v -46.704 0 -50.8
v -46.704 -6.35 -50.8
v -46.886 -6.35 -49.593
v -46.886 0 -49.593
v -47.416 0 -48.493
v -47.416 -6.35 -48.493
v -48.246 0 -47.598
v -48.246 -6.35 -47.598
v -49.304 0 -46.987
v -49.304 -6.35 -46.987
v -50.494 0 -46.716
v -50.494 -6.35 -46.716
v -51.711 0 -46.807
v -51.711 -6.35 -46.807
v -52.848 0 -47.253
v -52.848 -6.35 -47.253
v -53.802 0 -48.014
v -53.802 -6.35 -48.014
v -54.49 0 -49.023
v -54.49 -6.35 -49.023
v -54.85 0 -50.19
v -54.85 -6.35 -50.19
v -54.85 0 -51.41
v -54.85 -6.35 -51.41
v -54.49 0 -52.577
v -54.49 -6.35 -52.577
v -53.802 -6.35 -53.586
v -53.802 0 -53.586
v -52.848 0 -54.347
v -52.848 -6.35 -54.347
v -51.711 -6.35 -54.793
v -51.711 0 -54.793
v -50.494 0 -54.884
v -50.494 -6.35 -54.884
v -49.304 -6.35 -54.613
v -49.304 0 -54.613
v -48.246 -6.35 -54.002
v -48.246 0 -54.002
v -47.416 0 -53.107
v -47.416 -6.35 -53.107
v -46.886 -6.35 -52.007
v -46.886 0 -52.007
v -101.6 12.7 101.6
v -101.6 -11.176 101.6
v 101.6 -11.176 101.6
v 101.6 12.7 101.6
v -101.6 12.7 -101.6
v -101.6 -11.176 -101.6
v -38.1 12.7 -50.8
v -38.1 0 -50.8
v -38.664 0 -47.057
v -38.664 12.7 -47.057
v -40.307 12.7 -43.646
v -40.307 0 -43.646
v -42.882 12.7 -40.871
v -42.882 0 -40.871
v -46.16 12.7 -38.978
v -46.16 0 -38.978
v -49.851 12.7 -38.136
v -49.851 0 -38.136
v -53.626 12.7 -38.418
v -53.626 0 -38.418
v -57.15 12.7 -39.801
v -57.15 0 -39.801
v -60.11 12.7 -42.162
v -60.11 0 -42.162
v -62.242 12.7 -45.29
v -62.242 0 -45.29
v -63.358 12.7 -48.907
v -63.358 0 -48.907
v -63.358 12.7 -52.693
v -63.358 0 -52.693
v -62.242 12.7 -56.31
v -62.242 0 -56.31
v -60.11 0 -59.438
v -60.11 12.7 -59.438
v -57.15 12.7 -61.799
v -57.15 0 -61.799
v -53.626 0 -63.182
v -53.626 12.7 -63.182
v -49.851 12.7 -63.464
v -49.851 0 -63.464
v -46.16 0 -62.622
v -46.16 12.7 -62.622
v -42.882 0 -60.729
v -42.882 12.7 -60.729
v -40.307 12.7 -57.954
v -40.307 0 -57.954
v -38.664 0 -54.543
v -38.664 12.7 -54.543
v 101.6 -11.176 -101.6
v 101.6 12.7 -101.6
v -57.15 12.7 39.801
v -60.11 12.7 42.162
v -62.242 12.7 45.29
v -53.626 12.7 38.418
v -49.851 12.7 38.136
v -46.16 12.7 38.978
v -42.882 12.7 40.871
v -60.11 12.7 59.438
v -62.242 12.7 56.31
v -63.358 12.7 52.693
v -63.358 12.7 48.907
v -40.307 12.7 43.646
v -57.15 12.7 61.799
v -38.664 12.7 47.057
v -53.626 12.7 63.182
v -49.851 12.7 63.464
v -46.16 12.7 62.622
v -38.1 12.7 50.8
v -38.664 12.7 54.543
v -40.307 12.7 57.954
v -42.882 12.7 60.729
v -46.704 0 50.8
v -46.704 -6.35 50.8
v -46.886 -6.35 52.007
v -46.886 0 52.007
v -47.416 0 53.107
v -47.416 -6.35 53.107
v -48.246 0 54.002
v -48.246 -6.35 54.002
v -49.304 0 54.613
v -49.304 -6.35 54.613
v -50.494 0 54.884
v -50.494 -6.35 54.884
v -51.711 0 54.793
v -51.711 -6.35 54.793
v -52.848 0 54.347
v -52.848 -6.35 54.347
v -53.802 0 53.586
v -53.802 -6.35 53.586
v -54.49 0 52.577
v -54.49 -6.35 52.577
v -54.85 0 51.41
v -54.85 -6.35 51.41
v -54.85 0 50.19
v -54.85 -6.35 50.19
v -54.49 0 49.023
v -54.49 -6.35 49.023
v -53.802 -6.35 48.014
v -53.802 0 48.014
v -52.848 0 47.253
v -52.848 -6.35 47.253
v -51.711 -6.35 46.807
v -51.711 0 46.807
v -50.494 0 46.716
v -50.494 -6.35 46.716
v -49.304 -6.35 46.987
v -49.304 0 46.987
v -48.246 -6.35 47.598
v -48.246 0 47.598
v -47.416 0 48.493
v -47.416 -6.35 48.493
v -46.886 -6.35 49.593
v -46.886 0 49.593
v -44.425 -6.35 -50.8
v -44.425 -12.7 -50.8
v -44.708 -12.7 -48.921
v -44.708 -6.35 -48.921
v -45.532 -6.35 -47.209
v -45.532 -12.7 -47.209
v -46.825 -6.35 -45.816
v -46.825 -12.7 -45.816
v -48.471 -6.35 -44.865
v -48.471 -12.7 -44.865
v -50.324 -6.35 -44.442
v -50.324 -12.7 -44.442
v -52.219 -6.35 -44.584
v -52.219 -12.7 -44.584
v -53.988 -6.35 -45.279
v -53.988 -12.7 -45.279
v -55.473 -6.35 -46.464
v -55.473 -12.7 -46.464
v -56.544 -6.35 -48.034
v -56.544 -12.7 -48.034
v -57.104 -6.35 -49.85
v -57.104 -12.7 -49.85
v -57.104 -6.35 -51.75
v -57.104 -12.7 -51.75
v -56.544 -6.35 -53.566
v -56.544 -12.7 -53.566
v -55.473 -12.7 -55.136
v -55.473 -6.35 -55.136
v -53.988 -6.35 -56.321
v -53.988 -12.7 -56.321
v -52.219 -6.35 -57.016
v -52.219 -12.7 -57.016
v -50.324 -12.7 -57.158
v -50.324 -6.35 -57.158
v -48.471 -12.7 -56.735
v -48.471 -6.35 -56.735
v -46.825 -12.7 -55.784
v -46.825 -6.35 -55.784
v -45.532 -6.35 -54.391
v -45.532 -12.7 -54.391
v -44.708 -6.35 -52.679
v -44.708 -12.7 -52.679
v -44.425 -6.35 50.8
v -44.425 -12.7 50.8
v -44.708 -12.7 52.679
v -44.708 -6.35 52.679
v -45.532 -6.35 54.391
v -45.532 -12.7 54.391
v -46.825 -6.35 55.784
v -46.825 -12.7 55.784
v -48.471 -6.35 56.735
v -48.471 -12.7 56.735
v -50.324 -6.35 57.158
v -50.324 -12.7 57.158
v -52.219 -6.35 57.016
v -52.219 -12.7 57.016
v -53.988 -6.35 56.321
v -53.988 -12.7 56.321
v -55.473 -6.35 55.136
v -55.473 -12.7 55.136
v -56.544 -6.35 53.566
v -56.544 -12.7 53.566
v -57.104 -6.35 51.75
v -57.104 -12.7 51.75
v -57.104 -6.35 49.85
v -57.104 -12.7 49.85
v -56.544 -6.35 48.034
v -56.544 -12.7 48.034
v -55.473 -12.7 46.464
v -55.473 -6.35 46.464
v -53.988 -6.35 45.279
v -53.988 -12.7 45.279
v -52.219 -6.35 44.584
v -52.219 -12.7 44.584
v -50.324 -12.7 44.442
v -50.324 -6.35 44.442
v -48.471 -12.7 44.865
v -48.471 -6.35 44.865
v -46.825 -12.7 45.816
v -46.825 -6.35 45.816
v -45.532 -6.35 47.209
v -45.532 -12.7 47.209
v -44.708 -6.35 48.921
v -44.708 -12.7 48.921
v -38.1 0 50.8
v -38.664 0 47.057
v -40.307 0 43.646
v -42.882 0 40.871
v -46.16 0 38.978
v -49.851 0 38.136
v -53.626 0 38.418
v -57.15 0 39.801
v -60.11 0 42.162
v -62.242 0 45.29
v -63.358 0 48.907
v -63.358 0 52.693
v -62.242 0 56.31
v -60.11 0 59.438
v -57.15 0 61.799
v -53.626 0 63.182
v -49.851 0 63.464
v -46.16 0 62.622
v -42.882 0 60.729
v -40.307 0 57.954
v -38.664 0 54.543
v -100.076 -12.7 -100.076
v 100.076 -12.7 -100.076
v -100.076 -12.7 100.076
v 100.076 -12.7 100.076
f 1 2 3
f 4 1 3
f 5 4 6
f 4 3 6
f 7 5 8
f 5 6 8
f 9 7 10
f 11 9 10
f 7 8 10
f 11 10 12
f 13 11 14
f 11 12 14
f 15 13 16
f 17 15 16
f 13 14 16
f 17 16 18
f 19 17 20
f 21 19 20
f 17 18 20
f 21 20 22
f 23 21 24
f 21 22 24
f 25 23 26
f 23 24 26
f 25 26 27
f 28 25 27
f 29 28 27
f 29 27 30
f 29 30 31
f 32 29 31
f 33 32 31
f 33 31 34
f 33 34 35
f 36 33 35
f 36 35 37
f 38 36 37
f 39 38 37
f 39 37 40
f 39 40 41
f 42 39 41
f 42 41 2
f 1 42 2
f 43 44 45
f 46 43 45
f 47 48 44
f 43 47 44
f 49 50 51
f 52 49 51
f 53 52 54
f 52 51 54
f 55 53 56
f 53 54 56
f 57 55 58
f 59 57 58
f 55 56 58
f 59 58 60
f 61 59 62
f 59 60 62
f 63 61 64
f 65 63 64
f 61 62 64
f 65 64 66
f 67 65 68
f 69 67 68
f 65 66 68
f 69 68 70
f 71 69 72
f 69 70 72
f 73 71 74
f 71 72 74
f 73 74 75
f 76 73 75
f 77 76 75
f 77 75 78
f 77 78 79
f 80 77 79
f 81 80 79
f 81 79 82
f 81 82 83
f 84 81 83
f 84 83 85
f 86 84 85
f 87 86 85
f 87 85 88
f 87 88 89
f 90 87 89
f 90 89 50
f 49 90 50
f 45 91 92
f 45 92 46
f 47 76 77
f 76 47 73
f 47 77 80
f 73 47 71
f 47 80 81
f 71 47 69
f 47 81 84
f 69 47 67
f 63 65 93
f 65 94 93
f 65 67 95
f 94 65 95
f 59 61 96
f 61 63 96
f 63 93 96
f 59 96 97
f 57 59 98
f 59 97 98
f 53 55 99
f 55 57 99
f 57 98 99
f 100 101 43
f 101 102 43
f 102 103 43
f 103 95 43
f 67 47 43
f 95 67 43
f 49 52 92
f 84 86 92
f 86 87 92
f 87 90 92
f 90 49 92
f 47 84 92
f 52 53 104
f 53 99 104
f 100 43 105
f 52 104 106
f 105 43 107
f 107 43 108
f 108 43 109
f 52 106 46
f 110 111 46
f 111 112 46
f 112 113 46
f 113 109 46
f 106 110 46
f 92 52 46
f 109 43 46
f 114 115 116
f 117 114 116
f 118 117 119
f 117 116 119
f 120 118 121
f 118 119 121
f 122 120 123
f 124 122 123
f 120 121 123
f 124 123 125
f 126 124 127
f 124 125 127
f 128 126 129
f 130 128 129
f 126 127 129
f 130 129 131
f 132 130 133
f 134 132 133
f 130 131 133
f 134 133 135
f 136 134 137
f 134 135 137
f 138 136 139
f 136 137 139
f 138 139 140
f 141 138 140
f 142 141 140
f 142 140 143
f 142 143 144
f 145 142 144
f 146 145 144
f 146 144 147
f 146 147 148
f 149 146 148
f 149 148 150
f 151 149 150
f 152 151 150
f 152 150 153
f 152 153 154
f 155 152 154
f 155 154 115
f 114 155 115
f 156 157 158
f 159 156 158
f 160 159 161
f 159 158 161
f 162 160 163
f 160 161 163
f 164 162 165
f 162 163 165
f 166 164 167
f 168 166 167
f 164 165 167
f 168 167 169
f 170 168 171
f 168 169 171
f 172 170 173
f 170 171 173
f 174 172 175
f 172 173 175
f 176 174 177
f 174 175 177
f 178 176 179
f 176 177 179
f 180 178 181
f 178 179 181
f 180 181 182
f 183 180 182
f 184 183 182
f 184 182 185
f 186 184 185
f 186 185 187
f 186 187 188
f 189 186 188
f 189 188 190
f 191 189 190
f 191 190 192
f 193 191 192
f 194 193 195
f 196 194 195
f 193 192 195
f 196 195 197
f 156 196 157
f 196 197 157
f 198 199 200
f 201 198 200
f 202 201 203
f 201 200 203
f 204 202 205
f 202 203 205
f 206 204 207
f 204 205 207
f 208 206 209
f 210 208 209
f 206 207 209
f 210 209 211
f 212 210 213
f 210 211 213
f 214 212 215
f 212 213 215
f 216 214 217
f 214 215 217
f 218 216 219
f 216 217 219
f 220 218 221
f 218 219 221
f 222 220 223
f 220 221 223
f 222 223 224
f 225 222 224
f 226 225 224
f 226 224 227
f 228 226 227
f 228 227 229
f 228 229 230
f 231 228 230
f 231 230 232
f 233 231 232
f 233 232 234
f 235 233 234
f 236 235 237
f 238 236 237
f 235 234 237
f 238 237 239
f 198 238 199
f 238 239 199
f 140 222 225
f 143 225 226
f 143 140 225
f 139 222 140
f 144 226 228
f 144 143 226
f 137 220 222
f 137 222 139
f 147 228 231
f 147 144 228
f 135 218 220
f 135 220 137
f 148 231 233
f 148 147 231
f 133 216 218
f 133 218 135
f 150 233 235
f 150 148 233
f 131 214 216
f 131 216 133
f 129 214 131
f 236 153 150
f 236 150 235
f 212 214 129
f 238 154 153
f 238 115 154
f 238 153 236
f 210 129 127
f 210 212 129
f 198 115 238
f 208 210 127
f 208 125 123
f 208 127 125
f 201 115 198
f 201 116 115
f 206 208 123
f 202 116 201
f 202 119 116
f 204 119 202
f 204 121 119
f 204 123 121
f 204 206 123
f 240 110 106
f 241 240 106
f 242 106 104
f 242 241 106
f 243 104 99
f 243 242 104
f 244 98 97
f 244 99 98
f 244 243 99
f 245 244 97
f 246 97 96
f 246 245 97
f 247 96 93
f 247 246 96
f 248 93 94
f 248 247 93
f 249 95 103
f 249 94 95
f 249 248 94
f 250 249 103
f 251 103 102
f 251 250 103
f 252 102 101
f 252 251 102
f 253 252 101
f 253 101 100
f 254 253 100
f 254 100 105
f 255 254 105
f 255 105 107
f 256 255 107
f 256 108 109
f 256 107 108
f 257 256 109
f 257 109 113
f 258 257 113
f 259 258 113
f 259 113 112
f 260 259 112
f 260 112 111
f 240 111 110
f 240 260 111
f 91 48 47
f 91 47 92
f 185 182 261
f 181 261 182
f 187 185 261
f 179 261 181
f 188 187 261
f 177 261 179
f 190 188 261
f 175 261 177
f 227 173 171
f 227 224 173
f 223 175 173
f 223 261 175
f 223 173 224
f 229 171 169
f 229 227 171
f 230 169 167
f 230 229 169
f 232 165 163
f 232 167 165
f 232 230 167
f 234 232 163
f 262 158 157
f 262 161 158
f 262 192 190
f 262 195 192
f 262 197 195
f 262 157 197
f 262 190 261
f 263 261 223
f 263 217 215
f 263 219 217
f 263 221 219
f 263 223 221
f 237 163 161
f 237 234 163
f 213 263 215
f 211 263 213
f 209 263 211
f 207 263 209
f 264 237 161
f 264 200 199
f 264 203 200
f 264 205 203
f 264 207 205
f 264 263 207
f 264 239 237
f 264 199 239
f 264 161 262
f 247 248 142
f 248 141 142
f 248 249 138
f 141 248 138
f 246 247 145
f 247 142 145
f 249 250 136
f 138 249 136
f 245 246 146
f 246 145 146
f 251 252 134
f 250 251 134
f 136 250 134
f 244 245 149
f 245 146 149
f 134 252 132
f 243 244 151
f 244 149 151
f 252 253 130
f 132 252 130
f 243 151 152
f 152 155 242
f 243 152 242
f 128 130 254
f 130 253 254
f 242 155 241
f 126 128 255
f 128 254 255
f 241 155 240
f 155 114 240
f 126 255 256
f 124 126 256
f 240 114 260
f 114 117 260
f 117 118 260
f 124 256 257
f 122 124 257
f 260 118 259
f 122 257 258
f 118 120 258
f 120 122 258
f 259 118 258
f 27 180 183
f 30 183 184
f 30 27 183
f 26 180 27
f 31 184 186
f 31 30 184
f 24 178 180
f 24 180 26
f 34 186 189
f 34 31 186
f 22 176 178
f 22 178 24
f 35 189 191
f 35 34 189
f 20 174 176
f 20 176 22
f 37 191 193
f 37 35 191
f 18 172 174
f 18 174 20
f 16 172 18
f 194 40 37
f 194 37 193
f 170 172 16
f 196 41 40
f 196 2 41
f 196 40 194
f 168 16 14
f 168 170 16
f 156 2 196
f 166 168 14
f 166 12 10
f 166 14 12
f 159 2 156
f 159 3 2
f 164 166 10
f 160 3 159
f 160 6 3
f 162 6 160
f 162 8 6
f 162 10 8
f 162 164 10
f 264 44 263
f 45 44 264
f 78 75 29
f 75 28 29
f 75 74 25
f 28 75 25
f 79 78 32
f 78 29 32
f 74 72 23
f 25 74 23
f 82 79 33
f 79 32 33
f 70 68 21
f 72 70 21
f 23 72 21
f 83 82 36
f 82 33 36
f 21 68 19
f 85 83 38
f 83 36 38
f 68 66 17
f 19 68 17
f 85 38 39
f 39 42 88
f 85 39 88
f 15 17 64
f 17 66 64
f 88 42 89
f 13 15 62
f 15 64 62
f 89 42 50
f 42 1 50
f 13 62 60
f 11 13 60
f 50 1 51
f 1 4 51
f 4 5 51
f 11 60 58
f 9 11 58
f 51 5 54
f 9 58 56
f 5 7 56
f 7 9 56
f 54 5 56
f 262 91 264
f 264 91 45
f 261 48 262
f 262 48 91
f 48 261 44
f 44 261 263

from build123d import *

# Parameters (mm, degrees)
F0_W     = 203.2
F0_H     = 203.2
F1_DEPTH = 12.7
F2_SIZE  = 1.524
F3_R     = 12.7
F4_DEPTH = 25.401
F5_R     = 12.7
F5_R_2   = 4.09575
F6_DEPTH = 12.7
F7_R     = 6.3754
F8_DEPTH = 6.35


# Not quite as in the source:
# - a pattern or mirror of a feature is missing from the dataset's text; its kind, count and spacing are read off the source's solid


with BuildPart() as f1:
    # F0 (on Front) → F1 (new body, symmetric)
    with BuildSketch(Plane.XZ):
        Rectangle(F0_W, F0_H)
    extrude(amount=F1_DEPTH, both=True)

    # F2
    f2_edges = [f1.edges().sort_by_distance(p)[0] for p in [
        (101.6, -12.7, 0),
        (0, -12.7, 101.6),
        (-101.6, -12.7, 0),
        (0, -12.7, -101.6),
    ]]
    chamfer(f2_edges, length=F2_SIZE)

    # F3 (on face) → F4 (cut, through all)
    with BuildSketch(Plane.XZ.offset(12.7)):
        with Locations((-50.8, -50.8)):
            Circle(F3_R)
    f4 = extrude(amount=-F4_DEPTH, mode=Mode.SUBTRACT)

    # F4_copies: F4 across plane
    add(f4.mirror(Plane.XY), mode=Mode.SUBTRACT)

    # F5 (on face) → F6 (join)
    with BuildSketch(Plane.XZ.offset(12.7)):
        with Locations((-50.8, 50.8)):
            Circle(F5_R)
        with Locations((-50.8, 50.8)):
            Circle(F5_R_2, mode=Mode.SUBTRACT)
        with Locations((-50.8, -50.8)):
            Circle(F5_R)
        with Locations((-50.8, -50.8)):
            Circle(F5_R_2, mode=Mode.SUBTRACT)
    extrude(amount=-F6_DEPTH)

    # F7 (on face) → F8 (cut)
    with BuildSketch(Plane.XZ.offset(12.7)):
        with Locations((-50.8, 50.8)):
            Circle(F7_R)
        with Locations((-50.8, -50.8)):
            Circle(F7_R)
    extrude(amount=-F8_DEPTH, mode=Mode.SUBTRACT)


solid = f1.part
